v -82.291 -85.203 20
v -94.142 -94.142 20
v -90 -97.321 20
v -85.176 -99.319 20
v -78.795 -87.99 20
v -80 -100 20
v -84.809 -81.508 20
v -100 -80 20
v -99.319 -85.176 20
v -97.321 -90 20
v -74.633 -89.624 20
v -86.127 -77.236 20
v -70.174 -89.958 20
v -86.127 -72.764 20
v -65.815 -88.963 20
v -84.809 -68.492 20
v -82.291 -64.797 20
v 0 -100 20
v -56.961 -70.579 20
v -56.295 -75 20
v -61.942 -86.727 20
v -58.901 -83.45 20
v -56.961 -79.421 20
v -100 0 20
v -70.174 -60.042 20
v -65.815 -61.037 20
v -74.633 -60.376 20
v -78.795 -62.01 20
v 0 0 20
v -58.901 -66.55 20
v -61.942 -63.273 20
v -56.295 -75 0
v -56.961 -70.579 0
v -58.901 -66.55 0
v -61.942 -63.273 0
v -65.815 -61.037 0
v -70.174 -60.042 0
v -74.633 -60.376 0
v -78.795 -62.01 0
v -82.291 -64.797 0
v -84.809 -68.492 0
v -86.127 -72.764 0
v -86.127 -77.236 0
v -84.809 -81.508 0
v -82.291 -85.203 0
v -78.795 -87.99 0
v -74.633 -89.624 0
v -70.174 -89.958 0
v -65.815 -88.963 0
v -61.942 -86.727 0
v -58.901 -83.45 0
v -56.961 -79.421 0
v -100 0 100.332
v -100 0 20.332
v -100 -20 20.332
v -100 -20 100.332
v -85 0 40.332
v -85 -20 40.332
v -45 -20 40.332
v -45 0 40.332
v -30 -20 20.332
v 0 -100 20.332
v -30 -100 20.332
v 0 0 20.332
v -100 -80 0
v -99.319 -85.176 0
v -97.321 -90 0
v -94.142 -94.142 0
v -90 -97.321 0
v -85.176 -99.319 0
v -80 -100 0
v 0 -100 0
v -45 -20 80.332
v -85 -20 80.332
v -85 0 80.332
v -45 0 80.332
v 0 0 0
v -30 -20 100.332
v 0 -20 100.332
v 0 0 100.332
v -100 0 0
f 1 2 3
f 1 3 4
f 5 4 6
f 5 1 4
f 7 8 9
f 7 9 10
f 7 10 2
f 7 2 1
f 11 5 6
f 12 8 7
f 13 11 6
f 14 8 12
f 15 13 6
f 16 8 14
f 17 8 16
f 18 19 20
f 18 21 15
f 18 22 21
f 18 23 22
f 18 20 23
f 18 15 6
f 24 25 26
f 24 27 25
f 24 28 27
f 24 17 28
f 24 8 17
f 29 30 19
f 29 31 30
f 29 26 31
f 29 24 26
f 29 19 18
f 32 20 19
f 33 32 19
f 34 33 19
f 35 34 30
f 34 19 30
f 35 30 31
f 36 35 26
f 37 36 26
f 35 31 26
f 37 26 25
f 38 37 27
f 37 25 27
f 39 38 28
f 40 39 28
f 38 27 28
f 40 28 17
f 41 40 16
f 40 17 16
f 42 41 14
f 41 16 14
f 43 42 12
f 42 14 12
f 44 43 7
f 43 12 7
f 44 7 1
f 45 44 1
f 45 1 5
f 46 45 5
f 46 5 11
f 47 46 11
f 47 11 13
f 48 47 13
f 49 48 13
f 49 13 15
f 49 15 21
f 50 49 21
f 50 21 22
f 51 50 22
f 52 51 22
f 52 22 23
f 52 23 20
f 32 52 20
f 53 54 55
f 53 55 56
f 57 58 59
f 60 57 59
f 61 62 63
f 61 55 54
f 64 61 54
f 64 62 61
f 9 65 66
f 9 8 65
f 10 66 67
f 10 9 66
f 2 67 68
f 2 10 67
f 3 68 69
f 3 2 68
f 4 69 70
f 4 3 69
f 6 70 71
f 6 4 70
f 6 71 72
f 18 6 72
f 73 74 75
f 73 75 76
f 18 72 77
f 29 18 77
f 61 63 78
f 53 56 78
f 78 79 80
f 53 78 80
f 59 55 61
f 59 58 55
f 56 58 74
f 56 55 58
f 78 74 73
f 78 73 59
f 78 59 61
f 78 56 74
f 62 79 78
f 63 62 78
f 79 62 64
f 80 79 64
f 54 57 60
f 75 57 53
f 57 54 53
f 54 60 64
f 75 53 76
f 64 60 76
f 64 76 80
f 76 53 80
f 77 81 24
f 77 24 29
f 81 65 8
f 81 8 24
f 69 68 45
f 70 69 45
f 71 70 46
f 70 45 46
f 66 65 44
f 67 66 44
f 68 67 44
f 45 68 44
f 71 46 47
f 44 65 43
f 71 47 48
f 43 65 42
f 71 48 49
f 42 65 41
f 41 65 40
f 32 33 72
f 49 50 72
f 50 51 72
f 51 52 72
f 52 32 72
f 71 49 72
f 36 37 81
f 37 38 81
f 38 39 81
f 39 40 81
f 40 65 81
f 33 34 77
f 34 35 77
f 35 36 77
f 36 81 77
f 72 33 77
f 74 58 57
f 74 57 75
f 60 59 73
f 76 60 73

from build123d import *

# Parameters (mm, degrees)
F0_W      = 100
F0_H      = 100
F1_DEPTH  = 20
F2_W      = 100
F2_H      = 80
F3_DEPTH  = 20
F4_R      = 15
F5_DEPTH  = 22
F6_W      = 80
F6_H      = 80
F7_DEPTH  = 30
F8_SIZE   = 79.99999
F9_R      = 20
F10_W     = 40
F10_H     = 40
F11_DEPTH = 25


# Not quite as in the source:
# - a fillet or chamfer is up to 0.001 mm smaller than in the source, because OpenCascade refuses the exact size


with BuildPart() as f1:
    # F0 (on Top) → F1 (new body)
    with BuildSketch(Plane.XY):
        with Locations((-50, -50)):
            Rectangle(F0_W, F0_H)
    extrude(amount=F1_DEPTH)

    # F4 (on face) → F5 (cut)
    with BuildSketch(Plane.XY.offset(20)):
        with Locations((-71.2947770953, -75)):
            Circle(F4_R)
    extrude(amount=-F5_DEPTH, mode=Mode.SUBTRACT)

    # F9
    f9_edges = [f1.edges().sort_by_distance(p)[0] for p in [
        (-100, -100, 10),
    ]]
    fillet(f9_edges, radius=F9_R)


with BuildPart() as f3:
    # F2 (on Front) → F3 (new body)
    with BuildSketch(Plane.XZ):
        with Locations((-50, 60.3316903863)):
            Rectangle(F2_W, F2_H)
    extrude(amount=F3_DEPTH)

    # F6 (on face) → F7 (join)
    with BuildSketch(Plane.YZ):
        with Locations((-60, 60.3316903863)):
            Rectangle(F6_W, F6_H)
    extrude(amount=-F7_DEPTH)

    # F8 (size 80 in the source; OpenCascade refuses exactly that, so slightly less here)
    f8_edges = [f3.edges().sort_by_distance(p)[0] for p in [
        (-15, -100, 100.33169),
    ]]
    chamfer(f8_edges, length=F8_SIZE)

    # F10 (on face) → F11 (cut)
    with BuildSketch(Plane.XZ.offset(20)):
        with Locations((-65, 60.3316903863)):
            Rectangle(F10_W, F10_H)
    extrude(amount=-F11_DEPTH, mode=Mode.SUBTRACT)


solid = Compound([f1.part, f3.part])
